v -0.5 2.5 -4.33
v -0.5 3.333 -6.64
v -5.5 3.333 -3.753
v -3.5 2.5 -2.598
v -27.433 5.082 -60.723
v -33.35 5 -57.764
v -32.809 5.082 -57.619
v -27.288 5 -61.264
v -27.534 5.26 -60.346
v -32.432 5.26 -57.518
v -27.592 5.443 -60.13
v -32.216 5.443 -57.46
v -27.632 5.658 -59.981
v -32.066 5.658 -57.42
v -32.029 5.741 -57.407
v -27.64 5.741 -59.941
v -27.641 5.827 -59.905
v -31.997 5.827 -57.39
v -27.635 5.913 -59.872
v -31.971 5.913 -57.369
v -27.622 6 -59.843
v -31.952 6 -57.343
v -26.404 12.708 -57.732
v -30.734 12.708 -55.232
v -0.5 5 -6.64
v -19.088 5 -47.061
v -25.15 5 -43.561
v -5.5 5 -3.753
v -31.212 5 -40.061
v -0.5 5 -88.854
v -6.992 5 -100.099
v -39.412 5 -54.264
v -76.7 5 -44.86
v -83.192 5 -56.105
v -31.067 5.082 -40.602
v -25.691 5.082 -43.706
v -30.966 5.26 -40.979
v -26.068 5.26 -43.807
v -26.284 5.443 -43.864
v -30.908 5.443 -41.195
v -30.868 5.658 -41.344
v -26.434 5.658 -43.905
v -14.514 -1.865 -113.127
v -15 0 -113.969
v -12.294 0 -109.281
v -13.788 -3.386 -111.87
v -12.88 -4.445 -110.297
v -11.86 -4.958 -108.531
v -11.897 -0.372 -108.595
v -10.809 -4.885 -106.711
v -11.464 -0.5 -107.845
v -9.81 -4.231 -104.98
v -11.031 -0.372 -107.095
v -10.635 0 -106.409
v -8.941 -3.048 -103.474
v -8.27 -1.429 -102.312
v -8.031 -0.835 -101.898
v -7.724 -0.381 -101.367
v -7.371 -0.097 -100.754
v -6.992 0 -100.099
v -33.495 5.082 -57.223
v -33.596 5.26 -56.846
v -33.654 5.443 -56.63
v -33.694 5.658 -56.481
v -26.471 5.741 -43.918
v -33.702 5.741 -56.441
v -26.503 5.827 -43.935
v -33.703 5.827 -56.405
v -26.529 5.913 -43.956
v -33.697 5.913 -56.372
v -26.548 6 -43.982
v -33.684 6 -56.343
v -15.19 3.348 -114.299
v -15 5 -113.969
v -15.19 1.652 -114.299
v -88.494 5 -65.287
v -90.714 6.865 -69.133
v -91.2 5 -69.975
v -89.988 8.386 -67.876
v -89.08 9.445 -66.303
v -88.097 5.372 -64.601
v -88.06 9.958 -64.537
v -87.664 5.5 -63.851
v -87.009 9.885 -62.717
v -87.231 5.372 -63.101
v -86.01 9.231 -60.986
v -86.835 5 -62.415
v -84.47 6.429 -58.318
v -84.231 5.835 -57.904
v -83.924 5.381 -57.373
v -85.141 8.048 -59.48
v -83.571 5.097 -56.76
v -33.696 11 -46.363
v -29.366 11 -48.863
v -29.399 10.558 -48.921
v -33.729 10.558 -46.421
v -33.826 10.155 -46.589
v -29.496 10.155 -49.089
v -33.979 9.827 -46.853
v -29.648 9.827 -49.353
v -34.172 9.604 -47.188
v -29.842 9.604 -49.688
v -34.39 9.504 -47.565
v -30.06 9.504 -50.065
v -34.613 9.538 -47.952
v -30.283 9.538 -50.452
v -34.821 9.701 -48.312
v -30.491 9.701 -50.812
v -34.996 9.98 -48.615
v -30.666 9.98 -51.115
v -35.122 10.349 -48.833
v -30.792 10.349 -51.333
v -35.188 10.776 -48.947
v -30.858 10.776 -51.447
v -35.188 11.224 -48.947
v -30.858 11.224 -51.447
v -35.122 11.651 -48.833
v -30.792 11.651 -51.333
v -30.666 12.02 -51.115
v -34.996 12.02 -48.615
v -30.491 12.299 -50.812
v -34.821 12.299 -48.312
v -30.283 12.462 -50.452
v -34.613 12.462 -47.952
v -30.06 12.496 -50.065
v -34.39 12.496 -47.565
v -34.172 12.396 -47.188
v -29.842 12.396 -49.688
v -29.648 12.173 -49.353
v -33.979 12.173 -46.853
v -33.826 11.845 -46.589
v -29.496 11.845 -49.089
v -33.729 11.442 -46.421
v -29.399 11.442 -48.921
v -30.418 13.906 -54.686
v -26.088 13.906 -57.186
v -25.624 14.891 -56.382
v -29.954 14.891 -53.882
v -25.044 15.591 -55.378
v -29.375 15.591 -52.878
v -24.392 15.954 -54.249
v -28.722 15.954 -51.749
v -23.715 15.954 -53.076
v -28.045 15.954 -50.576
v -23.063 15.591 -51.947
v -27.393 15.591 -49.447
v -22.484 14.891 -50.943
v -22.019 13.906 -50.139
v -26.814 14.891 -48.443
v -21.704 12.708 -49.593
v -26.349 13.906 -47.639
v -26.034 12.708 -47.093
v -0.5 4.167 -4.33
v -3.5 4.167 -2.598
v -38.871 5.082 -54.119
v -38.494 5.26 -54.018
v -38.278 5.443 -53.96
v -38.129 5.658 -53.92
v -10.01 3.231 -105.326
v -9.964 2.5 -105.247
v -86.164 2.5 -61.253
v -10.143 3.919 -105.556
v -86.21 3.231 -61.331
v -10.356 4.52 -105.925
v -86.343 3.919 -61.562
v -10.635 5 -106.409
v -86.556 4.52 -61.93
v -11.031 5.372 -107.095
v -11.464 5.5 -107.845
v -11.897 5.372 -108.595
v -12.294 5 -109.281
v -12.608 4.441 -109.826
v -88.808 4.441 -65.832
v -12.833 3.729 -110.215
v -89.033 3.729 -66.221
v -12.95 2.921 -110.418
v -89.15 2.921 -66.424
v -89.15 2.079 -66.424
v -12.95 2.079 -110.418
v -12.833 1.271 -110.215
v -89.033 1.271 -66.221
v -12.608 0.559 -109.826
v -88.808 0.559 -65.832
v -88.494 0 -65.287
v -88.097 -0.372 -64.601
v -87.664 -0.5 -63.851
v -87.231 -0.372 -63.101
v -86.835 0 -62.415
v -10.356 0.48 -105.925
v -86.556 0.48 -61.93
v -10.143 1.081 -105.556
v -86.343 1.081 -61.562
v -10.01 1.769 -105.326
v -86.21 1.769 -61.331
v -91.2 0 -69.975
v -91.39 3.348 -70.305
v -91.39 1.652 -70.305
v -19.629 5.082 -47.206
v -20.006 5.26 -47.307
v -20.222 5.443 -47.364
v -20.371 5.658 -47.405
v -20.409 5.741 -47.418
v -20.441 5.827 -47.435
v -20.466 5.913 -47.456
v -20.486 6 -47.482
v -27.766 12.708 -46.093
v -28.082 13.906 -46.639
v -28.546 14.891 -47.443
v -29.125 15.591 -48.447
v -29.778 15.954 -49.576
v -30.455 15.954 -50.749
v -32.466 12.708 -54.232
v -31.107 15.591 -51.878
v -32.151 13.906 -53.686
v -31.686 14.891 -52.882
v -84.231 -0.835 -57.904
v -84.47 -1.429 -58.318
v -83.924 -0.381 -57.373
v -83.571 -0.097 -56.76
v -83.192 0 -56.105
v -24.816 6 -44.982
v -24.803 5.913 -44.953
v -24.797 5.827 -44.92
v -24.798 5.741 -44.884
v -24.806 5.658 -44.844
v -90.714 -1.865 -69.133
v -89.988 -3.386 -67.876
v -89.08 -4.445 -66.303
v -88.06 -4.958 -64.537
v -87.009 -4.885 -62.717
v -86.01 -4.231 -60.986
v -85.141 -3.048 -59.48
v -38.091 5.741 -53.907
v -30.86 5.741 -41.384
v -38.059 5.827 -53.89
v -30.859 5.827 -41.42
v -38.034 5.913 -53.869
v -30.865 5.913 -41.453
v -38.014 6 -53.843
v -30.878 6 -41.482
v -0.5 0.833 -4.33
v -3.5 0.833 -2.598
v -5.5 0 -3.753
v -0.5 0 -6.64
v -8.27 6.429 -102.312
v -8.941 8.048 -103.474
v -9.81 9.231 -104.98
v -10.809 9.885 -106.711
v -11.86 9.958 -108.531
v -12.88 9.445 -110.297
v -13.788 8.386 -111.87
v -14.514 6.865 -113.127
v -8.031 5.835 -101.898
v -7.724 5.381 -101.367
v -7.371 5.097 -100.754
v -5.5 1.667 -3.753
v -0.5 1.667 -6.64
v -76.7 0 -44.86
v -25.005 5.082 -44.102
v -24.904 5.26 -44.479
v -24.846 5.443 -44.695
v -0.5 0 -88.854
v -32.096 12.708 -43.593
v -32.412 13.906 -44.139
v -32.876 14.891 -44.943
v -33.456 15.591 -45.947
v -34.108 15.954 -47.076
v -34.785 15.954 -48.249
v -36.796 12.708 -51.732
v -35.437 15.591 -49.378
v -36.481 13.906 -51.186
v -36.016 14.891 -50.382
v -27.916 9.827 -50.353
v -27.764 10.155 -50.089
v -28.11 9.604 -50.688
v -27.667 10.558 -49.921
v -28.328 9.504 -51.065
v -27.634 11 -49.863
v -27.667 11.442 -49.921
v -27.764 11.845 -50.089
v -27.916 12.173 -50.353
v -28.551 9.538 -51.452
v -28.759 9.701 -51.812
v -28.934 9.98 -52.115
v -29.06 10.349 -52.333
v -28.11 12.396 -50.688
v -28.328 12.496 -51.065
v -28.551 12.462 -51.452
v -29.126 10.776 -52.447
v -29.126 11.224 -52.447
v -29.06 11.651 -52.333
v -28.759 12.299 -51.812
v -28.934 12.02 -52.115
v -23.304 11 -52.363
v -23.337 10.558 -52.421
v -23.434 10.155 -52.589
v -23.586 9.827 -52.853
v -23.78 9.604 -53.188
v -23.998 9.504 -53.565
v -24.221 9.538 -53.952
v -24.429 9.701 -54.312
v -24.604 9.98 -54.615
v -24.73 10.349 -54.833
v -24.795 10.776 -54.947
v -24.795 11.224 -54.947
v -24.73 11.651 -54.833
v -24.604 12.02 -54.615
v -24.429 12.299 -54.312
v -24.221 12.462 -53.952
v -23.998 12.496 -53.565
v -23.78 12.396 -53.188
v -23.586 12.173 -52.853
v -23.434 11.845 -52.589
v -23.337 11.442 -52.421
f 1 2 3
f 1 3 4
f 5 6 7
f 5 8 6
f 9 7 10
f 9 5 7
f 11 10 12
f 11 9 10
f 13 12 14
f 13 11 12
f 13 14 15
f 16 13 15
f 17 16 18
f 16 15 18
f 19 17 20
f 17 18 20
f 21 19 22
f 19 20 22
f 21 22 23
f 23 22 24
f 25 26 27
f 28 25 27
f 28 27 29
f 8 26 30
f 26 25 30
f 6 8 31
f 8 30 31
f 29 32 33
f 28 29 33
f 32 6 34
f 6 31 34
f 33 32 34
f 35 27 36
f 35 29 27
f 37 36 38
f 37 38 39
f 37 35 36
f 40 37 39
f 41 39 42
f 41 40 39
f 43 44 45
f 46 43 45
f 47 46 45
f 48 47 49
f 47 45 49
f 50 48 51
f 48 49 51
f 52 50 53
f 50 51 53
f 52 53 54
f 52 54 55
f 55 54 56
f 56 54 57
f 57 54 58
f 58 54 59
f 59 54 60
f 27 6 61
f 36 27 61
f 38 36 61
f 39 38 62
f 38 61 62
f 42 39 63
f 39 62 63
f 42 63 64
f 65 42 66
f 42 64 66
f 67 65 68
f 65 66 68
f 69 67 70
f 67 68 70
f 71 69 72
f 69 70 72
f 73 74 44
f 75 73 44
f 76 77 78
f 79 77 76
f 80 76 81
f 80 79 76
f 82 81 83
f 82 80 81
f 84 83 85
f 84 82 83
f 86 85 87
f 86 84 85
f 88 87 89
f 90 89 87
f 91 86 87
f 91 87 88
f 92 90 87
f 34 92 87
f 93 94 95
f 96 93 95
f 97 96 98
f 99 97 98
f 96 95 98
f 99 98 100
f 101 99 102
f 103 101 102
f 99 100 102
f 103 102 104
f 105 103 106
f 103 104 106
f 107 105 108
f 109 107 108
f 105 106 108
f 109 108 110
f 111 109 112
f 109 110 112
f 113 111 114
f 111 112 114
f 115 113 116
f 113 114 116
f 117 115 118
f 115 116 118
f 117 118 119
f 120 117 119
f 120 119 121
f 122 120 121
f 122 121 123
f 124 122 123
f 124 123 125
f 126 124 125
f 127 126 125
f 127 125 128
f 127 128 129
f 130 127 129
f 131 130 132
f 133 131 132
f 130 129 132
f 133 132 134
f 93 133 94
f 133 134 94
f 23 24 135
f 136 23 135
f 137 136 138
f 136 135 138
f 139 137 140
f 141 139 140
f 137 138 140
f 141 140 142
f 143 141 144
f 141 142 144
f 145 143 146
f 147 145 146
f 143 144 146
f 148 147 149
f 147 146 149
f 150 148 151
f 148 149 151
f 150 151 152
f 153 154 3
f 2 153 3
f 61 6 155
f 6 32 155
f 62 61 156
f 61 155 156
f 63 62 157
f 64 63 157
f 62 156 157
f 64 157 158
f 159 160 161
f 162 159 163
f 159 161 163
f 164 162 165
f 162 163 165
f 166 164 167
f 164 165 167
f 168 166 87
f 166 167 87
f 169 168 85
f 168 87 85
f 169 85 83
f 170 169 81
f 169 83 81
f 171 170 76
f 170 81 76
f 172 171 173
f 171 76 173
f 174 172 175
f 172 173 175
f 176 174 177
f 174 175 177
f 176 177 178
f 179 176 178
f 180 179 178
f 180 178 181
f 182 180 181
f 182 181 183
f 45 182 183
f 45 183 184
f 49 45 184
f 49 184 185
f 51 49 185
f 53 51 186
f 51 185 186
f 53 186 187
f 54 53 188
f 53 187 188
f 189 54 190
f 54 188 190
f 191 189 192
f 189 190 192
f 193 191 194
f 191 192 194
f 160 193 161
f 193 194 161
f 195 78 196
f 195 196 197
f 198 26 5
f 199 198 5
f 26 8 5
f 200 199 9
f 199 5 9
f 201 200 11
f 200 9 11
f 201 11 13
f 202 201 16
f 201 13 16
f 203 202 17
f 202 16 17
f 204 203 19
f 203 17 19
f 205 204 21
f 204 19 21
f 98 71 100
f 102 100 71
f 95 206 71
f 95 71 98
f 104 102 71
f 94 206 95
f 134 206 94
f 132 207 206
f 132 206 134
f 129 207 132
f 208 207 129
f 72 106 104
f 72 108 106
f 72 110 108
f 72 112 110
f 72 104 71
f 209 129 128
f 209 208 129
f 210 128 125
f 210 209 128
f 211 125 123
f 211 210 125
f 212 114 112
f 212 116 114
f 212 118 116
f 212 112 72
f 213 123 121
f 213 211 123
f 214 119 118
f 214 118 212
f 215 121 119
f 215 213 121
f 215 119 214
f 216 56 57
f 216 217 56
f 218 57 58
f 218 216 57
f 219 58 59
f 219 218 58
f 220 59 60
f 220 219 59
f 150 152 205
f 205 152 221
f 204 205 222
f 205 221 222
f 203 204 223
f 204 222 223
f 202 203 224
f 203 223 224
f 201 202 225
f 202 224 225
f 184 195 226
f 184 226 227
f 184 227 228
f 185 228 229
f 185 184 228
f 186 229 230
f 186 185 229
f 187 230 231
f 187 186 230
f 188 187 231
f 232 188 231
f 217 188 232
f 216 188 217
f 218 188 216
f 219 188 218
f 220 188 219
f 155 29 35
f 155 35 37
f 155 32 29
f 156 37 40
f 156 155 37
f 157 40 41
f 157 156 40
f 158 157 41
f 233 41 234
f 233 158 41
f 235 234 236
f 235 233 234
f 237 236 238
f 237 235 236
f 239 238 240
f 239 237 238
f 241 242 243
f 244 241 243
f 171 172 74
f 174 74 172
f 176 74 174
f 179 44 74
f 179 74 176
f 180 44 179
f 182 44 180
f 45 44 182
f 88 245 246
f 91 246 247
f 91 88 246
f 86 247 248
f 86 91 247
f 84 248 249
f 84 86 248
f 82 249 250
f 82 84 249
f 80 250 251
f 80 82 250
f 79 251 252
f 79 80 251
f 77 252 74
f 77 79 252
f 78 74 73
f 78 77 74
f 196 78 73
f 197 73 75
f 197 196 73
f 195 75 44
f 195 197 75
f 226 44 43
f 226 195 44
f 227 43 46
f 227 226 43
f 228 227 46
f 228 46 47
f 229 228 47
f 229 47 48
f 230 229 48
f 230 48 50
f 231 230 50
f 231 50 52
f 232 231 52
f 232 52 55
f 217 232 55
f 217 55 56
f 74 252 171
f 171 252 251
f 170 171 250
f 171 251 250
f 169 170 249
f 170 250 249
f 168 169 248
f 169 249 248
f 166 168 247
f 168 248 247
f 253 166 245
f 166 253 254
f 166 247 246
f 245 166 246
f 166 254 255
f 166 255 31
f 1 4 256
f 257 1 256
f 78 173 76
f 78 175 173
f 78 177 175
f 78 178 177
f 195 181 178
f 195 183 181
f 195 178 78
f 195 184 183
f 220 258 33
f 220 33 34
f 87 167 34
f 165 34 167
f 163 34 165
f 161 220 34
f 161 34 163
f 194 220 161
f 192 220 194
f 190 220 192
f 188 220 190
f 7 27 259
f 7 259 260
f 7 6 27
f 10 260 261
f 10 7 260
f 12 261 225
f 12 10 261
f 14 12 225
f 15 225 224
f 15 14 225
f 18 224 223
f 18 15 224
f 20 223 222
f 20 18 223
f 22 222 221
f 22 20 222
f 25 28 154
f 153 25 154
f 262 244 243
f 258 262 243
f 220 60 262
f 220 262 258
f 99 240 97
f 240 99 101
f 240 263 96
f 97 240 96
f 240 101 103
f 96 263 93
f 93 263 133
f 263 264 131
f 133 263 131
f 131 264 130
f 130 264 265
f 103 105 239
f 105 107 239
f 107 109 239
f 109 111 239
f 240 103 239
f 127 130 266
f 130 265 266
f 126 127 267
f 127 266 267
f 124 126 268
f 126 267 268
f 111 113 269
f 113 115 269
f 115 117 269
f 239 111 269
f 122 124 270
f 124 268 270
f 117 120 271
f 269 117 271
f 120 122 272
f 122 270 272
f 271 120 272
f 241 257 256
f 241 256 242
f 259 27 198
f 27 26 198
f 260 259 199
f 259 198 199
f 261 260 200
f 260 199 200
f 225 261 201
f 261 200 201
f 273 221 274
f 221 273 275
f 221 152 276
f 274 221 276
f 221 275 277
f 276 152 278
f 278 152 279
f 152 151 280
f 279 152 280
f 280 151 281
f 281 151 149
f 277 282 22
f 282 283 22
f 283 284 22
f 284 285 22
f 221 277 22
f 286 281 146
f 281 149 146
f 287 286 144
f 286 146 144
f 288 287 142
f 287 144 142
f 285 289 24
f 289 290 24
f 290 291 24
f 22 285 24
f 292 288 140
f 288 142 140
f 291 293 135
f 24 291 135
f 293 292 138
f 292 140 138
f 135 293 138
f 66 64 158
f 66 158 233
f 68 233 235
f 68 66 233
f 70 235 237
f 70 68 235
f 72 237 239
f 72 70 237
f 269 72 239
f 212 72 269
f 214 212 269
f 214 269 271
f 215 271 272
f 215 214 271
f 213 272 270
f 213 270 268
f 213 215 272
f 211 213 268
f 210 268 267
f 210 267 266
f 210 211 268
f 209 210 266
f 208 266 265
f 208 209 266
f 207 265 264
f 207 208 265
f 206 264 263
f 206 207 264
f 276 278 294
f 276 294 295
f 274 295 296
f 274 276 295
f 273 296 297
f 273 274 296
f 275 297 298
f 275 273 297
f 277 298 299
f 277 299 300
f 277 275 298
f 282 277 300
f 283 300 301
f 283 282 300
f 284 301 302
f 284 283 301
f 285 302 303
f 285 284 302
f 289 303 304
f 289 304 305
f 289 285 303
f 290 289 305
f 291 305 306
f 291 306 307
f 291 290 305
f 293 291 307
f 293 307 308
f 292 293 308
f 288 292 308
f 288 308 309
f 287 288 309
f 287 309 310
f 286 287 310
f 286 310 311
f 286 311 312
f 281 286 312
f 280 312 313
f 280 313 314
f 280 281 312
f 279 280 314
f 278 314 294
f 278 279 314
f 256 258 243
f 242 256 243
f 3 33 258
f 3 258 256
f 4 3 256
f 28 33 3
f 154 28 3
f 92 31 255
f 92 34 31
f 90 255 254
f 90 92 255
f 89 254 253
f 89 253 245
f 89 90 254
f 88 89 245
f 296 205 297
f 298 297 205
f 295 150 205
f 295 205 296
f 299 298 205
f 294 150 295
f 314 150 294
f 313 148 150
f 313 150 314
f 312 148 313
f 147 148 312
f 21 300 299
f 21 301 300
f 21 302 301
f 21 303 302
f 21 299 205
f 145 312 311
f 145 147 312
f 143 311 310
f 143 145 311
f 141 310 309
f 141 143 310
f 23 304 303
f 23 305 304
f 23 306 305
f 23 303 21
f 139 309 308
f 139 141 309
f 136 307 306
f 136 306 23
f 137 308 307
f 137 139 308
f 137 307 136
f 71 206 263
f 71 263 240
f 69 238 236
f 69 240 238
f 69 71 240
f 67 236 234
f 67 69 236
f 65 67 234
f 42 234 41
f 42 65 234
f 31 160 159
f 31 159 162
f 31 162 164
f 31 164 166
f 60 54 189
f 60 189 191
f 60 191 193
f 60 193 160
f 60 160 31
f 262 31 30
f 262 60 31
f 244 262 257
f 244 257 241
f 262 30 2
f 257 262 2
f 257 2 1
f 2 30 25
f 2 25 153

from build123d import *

# Parameters (mm, degrees)
BOSS_EXTRUDE1_DEPTH = 5
SKETCH2_R           = 7.5
BOSS_EXTRUDE2_DEPTH = 87.988181024
SKETCH3_R           = 3
CUT_EXTRUDE1_DEPTH  = 87.988181024
CUT_EXTRUDE2_DEPTH  = 5
BOSS_EXTRUDE3_DEPTH = 6.928203
CUT_EXTRUDE3_START  = -0.5
SKETCH10_W          = 96.059977794
SKETCH10_H          = 5
CUT_EXTRUDE3_DEPTH  = 10.5
BOSS_EXTRUDE4_START = 1
SKETCH11_R          = 1.5
BOSS_EXTRUDE4_DEPTH = 5
FILLET1_R           = 1
FILLET2_R           = 3


with BuildPart() as part:
    # Sketch1 → Boss-Extrude1 (new body)
    with BuildSketch(Plane(origin=(0, 0, 0), x_dir=(1, 0, 0), z_dir=(0, 1, 0))):
        Polygon((0, 87.988181024), (0, 0), (-76.2, 43.994090512), (-91.2, 69.974852626), (-15, 113.968943138), align=None)
    extrude(amount=BOSS_EXTRUDE1_DEPTH)

    # Sketch2 → Boss-Extrude2 (add)
    with BuildSketch(Plane(origin=(-38.1, 0, 21.997045256), x_dir=(0.49999999999999967, 0, 0.8660254037844388), z_dir=(-0.8660254037844388, 0, 0.49999999999999967))):
        with Locations((-99.128932188, 2.5)):
            Circle(SKETCH2_R)
    extrude(amount=-BOSS_EXTRUDE2_DEPTH)

    # Sketch3 → Cut-Extrude1 (cut)
    with BuildSketch(Plane(origin=(-38.1, 0, 21.997045256), x_dir=(0.49999999999999967, 0, 0.8660254037844388), z_dir=(-0.8660254037844388, 0, 0.49999999999999967))):
        with Locations((-99.128932188, 2.5)):
            Circle(SKETCH3_R)
    extrude(amount=-CUT_EXTRUDE1_DEPTH, mode=Mode.SUBTRACT)

    # Sketch5 → Cut-Extrude2 (cut)
    with BuildSketch(Plane(origin=(0, 5, 0), x_dir=(1, 0, 0), z_dir=(0, 1, 0))):
        Polygon((-6, 3.464101615), (0, 6.92820323), (0, 0), align=None)
    extrude(amount=-CUT_EXTRUDE2_DEPTH, mode=Mode.SUBTRACT)

    # Sketch7 → Boss-Extrude3 (add)
    with BuildSketch(Plane(origin=(-3, 0, 1.732050808), x_dir=(0, 1, 0), z_dir=(0.8660254037844383, 0, -0.5000000000000006))):
        Polygon((0.833333333, -4), (0, -6), (1.666666667, -6), align=None)
        Polygon((2.5, -4), (1.666666667, -6), (3.333333333, -6), align=None)
        Polygon((4.166666667, -4), (3.333333333, -6), (5, -6), align=None)
    extrude(amount=BOSS_EXTRUDE3_DEPTH)

    # Sketch10 → Cut-Extrude3 (cut)
    with BuildSketch(Plane(origin=(0, 0, 0), x_dir=(0.8660254037844386, 0, 0.5000000000000001), z_dir=(-0.5000000000000001, 0, 0.8660254037844386)).offset(CUT_EXTRUDE3_START)):
        with Locations((-44.958192127, 2.5)):
            Rectangle(SKETCH10_W, SKETCH10_H)
    cut_extrude3 = extrude(amount=CUT_EXTRUDE3_DEPTH, mode=Mode.SUBTRACT)

    # Mirror1: Cut-Extrude3 across plane
    add(cut_extrude3.mirror(Plane(origin=(0, 0, 0), x_dir=(0.4999999999999997, 0, 0.8660254037844387), z_dir=(0.8660254037844387, 0, -0.49999999999999983))), mode=Mode.SUBTRACT)

    # Sketch11 → Boss-Extrude4 (add)
    with BuildSketch(Plane(origin=(0, 0, 0), x_dir=(-0.49999999999999983, 0, -0.8660254037844387), z_dir=(0.8660254037844387, 0, -0.49999999999999983)).offset(BOSS_EXTRUDE4_START)):
        with BuildLine():
            Line((53.800614721, 12.707564932), (51, 5))
            Line((51, 5), (66, 5))
            Line((66, 5), (63.199385279, 12.707564932))
            ThreePointArc((63.199385279, 12.707564932), (58.5, 16), (53.800614721, 12.707564932))
        make_face()
        with Locations(Location((58.5, 11, 0), (0, 0, 180))):
            Circle(SKETCH11_R, mode=Mode.SUBTRACT)
    boss_extrude4 = extrude(amount=BOSS_EXTRUDE4_DEPTH)

    # Mirror2: Boss-Extrude4 across plane
    add(boss_extrude4.mirror(Plane(origin=(0, 0, 0), x_dir=(0.4999999999999997, 0, 0.8660254037844387), z_dir=(0.8660254037844387, 0, -0.49999999999999983))))

    # Fillet1
    fillet1_edges = [part.edges().sort_by_distance(p)[0] for p in [
        (-24.053847577, 5, -53.662486121),
        (-28.383974596, 5, -51.162486121),
        (-22.468911087, 5, -45.917295593),
        (-29.968911087, 5, -58.90767665),
        (-34.446152423, 5, -47.662486121),
        (-36.031088913, 5, -55.40767665),
        (-28.531088913, 5, -42.417295593),
        (-30.116025404, 5, -50.162486121),
    ]]
    fillet(fillet1_edges, radius=FILLET1_R - 0.0001)  # a hair under: the kernel refuses the full size

    # Fillet2
    fillet2_edges = [part.edges().sort_by_distance(p)[0] for p in [
        (-46.028932188, 0, -79.724449168),
        (-46.028932188, 5, -79.724449168),
    ]]
    fillet(fillet2_edges, radius=FILLET2_R)


solid = part.part
